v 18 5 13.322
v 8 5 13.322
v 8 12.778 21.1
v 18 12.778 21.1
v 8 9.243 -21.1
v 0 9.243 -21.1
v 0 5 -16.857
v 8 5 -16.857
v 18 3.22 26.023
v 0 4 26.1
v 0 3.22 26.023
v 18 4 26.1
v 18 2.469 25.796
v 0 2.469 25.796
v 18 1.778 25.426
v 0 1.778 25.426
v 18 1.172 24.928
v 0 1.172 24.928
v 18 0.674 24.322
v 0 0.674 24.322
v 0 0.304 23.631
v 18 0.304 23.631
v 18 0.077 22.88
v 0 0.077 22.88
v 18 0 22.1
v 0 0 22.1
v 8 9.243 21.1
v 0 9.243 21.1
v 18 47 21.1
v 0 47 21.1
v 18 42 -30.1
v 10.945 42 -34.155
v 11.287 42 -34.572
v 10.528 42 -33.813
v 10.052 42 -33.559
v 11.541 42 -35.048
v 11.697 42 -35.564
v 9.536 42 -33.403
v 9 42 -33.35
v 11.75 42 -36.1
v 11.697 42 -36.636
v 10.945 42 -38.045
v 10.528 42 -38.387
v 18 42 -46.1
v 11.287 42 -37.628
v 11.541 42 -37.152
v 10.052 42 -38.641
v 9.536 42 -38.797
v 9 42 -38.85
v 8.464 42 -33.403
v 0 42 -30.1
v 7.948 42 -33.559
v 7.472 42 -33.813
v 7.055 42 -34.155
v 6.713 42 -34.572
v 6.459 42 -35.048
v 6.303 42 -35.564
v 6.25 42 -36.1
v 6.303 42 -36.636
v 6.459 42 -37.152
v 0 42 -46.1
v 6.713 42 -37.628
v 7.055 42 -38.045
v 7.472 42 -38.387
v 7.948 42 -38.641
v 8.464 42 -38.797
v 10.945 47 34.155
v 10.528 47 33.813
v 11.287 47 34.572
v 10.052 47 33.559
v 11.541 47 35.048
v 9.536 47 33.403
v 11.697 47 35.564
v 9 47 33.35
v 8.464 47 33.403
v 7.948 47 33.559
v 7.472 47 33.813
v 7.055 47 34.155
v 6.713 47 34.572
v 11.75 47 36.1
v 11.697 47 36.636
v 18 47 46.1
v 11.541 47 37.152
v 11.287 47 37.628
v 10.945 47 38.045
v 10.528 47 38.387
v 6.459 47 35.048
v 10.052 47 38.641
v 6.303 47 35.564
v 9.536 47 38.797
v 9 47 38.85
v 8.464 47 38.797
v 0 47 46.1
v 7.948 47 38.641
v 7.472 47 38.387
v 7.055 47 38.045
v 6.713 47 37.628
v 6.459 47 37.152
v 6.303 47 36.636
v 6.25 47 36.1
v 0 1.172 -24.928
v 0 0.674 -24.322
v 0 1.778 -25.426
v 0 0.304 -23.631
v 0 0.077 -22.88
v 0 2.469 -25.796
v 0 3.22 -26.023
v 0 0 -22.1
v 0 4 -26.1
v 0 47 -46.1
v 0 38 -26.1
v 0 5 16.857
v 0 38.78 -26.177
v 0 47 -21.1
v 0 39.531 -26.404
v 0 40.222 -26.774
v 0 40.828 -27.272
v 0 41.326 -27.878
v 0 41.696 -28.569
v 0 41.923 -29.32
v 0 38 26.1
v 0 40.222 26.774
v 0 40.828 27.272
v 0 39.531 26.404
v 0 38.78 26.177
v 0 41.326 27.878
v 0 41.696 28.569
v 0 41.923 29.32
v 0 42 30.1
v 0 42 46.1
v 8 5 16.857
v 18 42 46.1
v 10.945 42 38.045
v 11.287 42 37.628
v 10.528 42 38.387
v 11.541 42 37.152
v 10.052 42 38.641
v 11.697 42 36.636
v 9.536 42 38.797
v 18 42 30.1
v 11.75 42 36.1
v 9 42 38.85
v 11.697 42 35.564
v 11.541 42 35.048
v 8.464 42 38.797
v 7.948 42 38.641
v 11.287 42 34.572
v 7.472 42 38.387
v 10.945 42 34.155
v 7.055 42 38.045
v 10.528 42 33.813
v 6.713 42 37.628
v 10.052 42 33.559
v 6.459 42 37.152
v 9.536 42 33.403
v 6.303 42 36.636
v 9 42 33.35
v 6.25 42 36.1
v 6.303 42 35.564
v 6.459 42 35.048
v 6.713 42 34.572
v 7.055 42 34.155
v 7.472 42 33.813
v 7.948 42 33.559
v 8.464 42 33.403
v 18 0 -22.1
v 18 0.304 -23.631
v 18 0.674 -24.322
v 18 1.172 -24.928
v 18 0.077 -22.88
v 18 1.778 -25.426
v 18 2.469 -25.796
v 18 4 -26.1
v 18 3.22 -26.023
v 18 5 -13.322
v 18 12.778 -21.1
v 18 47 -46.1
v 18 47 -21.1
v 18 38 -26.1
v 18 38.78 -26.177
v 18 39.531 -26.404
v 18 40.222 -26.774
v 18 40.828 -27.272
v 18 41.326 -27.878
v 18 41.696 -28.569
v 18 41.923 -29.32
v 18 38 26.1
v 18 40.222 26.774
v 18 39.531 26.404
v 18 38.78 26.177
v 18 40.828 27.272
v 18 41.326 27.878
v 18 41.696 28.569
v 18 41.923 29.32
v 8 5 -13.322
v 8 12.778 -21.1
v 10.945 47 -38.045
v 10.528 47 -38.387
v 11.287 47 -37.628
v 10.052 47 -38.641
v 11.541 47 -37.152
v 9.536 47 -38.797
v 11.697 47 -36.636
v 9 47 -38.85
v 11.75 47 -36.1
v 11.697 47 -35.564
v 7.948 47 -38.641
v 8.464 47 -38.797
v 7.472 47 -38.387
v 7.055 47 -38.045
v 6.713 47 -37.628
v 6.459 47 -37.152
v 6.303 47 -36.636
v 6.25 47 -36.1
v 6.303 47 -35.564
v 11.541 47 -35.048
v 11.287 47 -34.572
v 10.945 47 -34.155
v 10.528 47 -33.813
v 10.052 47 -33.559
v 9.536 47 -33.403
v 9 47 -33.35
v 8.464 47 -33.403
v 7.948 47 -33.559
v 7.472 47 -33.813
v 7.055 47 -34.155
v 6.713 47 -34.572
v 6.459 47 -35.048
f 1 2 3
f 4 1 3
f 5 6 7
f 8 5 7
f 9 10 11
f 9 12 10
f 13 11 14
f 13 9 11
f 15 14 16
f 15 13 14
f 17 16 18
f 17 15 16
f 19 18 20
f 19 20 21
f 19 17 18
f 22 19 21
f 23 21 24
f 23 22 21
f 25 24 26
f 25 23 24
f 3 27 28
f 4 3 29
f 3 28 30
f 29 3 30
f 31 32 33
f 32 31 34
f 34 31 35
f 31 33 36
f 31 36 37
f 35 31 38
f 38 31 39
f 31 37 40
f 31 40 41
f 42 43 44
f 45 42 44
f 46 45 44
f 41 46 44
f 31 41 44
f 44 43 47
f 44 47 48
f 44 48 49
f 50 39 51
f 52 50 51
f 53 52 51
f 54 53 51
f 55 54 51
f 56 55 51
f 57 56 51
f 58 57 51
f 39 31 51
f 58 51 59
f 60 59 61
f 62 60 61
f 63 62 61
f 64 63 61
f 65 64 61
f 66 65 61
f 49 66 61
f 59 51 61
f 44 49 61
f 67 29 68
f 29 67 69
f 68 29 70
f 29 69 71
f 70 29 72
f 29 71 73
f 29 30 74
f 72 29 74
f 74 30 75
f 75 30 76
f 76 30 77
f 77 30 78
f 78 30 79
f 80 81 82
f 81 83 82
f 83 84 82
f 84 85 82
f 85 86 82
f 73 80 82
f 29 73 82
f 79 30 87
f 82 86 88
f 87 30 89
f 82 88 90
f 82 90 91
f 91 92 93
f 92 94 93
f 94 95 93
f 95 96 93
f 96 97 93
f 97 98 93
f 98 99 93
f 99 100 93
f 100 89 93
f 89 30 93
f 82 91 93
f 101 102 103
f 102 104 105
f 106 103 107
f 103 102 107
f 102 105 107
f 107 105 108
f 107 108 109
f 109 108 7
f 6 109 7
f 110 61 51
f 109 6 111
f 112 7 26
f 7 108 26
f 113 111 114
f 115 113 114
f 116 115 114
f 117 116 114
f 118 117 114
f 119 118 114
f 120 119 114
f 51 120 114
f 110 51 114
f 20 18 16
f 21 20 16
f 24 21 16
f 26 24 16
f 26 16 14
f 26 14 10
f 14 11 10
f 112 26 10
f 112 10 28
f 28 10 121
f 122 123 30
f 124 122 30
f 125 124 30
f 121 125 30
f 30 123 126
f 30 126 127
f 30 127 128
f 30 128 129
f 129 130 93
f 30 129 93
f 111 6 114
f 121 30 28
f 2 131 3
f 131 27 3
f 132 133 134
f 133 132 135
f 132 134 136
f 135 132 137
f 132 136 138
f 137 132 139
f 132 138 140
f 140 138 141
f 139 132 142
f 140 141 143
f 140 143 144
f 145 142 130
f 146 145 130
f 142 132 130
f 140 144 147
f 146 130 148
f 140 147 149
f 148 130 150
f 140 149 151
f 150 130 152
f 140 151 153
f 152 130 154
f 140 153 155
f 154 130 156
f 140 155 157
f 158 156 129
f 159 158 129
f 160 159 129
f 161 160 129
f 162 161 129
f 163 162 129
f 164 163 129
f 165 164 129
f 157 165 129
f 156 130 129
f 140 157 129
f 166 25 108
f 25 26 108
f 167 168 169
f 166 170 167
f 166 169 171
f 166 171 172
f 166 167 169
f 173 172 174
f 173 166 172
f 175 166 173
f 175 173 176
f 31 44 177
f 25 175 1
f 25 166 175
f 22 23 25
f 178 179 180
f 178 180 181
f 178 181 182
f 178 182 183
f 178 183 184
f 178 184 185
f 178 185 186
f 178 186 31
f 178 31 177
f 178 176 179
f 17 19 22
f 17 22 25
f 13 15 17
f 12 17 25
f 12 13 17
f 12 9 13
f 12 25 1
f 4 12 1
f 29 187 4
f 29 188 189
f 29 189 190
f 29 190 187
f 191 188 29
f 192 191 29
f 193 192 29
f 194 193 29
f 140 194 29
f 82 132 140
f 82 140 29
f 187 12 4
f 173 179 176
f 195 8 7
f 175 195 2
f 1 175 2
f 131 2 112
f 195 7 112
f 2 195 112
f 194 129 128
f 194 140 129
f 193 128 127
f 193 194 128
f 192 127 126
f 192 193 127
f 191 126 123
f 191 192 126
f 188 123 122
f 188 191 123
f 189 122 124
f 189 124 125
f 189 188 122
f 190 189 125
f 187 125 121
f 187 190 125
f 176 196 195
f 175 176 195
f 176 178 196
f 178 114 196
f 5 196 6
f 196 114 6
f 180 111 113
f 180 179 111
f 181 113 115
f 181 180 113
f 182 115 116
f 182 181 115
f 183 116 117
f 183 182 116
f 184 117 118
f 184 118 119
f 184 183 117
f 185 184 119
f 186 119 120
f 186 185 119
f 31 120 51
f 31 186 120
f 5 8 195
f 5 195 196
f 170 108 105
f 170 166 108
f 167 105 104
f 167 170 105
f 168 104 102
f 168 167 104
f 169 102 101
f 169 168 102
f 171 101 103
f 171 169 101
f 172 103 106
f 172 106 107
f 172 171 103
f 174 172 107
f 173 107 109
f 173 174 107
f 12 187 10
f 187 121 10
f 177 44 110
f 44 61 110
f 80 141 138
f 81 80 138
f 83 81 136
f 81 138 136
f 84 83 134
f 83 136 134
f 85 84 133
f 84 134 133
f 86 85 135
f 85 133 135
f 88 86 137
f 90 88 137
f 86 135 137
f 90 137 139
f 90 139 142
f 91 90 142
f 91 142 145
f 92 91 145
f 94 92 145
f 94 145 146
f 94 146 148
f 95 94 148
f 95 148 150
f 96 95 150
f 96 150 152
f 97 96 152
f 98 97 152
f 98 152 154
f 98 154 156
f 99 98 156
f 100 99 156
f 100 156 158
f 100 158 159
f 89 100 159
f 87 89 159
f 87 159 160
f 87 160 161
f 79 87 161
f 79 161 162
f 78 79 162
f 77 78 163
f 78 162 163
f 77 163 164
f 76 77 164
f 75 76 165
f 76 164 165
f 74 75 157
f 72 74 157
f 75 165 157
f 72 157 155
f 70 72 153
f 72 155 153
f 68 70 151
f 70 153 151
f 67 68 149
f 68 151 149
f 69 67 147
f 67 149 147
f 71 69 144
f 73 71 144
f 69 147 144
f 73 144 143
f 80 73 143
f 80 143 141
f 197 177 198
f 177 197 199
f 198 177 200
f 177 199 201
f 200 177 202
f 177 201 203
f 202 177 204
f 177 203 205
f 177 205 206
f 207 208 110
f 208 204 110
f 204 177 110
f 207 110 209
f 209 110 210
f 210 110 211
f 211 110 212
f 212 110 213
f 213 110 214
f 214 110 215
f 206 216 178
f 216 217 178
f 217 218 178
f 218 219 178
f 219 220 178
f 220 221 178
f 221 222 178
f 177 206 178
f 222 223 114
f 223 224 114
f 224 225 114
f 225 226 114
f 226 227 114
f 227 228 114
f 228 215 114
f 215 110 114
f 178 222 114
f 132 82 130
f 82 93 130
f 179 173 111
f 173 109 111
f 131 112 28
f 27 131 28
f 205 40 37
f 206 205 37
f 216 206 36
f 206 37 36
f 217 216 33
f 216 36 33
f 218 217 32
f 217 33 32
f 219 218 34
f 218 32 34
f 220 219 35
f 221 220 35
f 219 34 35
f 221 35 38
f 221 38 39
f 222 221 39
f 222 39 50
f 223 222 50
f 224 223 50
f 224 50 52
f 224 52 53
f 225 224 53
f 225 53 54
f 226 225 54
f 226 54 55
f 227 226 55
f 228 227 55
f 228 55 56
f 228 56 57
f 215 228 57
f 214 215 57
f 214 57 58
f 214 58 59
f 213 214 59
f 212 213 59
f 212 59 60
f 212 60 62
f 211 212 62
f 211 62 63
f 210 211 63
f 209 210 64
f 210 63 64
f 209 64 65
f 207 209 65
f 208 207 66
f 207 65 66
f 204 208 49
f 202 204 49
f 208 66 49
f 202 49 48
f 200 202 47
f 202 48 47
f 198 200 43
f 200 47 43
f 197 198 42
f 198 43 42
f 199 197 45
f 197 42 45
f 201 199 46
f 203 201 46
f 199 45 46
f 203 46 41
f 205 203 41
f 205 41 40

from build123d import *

# Parameters (mm, degrees)
F1_DEPTH = 8
F3_DEPTH = 10
F4_R     = 2.75
F5_DEPTH = 25
F6_R     = 4


with BuildPart() as f1:
    # F0 (on Right) → F1 (new body)
    with BuildSketch(Plane.YZ):
        Polygon((0, 26.1), (0, 0), (0, -26.1), (42, -26.1), (42, -46.1), (47, -46.1), (47, -21.1), (9.242641, -21.1), (5, -16.857359), (5, 0), (5, 16.857359), (9.242641, 21.1), (47, 21.1), (47, 46.1), (42, 46.1), (42, 26.1), align=None)
    extrude(amount=F1_DEPTH)

    # F2 (on face) → F3 (join)
    with BuildSketch(Plane.YZ.offset(8)):
        Polygon((5, 13.321825), (12.778175, 21.1), (9.242641, 21.1), (5, 16.857359), align=None)
        Polygon((0, 26.1), (0, -26.1), (42, -26.1), (42, -46.1), (47, -46.1), (47, -21.1), (12.778175, -21.1), (9.242641, -21.1), (5, -16.857359), (5, -13.321825), (5, 0), (5, 13.321825), (5, 16.857359), (9.242641, 21.1), (12.778175, 21.1), (47, 21.1), (47, 46.1), (42, 46.1), (42, 26.1), align=None)
        Polygon((9.242641, -21.1), (12.778175, -21.1), (5, -13.321825), (5, -16.857359), align=None)
    extrude(amount=F3_DEPTH)

    # F4 (on face) → F5 (cut)
    with BuildSketch(Plane.XZ.offset(-42)):
        with Locations((9, 36.1)):
            Circle(F4_R)
        with Locations((9, -36.1)):
            Circle(F4_R)
    extrude(amount=-F5_DEPTH, mode=Mode.SUBTRACT)

    # F6
    f6_edges = [f1.edges().sort_by_distance(p)[0] for p in [
        (9, 0, 26.1),
        (9, 0, -26.1),
        (9, 42, -26.1),
        (9, 42, 26.1),
    ]]
    fillet(f6_edges, radius=F6_R)


solid = f1.part
